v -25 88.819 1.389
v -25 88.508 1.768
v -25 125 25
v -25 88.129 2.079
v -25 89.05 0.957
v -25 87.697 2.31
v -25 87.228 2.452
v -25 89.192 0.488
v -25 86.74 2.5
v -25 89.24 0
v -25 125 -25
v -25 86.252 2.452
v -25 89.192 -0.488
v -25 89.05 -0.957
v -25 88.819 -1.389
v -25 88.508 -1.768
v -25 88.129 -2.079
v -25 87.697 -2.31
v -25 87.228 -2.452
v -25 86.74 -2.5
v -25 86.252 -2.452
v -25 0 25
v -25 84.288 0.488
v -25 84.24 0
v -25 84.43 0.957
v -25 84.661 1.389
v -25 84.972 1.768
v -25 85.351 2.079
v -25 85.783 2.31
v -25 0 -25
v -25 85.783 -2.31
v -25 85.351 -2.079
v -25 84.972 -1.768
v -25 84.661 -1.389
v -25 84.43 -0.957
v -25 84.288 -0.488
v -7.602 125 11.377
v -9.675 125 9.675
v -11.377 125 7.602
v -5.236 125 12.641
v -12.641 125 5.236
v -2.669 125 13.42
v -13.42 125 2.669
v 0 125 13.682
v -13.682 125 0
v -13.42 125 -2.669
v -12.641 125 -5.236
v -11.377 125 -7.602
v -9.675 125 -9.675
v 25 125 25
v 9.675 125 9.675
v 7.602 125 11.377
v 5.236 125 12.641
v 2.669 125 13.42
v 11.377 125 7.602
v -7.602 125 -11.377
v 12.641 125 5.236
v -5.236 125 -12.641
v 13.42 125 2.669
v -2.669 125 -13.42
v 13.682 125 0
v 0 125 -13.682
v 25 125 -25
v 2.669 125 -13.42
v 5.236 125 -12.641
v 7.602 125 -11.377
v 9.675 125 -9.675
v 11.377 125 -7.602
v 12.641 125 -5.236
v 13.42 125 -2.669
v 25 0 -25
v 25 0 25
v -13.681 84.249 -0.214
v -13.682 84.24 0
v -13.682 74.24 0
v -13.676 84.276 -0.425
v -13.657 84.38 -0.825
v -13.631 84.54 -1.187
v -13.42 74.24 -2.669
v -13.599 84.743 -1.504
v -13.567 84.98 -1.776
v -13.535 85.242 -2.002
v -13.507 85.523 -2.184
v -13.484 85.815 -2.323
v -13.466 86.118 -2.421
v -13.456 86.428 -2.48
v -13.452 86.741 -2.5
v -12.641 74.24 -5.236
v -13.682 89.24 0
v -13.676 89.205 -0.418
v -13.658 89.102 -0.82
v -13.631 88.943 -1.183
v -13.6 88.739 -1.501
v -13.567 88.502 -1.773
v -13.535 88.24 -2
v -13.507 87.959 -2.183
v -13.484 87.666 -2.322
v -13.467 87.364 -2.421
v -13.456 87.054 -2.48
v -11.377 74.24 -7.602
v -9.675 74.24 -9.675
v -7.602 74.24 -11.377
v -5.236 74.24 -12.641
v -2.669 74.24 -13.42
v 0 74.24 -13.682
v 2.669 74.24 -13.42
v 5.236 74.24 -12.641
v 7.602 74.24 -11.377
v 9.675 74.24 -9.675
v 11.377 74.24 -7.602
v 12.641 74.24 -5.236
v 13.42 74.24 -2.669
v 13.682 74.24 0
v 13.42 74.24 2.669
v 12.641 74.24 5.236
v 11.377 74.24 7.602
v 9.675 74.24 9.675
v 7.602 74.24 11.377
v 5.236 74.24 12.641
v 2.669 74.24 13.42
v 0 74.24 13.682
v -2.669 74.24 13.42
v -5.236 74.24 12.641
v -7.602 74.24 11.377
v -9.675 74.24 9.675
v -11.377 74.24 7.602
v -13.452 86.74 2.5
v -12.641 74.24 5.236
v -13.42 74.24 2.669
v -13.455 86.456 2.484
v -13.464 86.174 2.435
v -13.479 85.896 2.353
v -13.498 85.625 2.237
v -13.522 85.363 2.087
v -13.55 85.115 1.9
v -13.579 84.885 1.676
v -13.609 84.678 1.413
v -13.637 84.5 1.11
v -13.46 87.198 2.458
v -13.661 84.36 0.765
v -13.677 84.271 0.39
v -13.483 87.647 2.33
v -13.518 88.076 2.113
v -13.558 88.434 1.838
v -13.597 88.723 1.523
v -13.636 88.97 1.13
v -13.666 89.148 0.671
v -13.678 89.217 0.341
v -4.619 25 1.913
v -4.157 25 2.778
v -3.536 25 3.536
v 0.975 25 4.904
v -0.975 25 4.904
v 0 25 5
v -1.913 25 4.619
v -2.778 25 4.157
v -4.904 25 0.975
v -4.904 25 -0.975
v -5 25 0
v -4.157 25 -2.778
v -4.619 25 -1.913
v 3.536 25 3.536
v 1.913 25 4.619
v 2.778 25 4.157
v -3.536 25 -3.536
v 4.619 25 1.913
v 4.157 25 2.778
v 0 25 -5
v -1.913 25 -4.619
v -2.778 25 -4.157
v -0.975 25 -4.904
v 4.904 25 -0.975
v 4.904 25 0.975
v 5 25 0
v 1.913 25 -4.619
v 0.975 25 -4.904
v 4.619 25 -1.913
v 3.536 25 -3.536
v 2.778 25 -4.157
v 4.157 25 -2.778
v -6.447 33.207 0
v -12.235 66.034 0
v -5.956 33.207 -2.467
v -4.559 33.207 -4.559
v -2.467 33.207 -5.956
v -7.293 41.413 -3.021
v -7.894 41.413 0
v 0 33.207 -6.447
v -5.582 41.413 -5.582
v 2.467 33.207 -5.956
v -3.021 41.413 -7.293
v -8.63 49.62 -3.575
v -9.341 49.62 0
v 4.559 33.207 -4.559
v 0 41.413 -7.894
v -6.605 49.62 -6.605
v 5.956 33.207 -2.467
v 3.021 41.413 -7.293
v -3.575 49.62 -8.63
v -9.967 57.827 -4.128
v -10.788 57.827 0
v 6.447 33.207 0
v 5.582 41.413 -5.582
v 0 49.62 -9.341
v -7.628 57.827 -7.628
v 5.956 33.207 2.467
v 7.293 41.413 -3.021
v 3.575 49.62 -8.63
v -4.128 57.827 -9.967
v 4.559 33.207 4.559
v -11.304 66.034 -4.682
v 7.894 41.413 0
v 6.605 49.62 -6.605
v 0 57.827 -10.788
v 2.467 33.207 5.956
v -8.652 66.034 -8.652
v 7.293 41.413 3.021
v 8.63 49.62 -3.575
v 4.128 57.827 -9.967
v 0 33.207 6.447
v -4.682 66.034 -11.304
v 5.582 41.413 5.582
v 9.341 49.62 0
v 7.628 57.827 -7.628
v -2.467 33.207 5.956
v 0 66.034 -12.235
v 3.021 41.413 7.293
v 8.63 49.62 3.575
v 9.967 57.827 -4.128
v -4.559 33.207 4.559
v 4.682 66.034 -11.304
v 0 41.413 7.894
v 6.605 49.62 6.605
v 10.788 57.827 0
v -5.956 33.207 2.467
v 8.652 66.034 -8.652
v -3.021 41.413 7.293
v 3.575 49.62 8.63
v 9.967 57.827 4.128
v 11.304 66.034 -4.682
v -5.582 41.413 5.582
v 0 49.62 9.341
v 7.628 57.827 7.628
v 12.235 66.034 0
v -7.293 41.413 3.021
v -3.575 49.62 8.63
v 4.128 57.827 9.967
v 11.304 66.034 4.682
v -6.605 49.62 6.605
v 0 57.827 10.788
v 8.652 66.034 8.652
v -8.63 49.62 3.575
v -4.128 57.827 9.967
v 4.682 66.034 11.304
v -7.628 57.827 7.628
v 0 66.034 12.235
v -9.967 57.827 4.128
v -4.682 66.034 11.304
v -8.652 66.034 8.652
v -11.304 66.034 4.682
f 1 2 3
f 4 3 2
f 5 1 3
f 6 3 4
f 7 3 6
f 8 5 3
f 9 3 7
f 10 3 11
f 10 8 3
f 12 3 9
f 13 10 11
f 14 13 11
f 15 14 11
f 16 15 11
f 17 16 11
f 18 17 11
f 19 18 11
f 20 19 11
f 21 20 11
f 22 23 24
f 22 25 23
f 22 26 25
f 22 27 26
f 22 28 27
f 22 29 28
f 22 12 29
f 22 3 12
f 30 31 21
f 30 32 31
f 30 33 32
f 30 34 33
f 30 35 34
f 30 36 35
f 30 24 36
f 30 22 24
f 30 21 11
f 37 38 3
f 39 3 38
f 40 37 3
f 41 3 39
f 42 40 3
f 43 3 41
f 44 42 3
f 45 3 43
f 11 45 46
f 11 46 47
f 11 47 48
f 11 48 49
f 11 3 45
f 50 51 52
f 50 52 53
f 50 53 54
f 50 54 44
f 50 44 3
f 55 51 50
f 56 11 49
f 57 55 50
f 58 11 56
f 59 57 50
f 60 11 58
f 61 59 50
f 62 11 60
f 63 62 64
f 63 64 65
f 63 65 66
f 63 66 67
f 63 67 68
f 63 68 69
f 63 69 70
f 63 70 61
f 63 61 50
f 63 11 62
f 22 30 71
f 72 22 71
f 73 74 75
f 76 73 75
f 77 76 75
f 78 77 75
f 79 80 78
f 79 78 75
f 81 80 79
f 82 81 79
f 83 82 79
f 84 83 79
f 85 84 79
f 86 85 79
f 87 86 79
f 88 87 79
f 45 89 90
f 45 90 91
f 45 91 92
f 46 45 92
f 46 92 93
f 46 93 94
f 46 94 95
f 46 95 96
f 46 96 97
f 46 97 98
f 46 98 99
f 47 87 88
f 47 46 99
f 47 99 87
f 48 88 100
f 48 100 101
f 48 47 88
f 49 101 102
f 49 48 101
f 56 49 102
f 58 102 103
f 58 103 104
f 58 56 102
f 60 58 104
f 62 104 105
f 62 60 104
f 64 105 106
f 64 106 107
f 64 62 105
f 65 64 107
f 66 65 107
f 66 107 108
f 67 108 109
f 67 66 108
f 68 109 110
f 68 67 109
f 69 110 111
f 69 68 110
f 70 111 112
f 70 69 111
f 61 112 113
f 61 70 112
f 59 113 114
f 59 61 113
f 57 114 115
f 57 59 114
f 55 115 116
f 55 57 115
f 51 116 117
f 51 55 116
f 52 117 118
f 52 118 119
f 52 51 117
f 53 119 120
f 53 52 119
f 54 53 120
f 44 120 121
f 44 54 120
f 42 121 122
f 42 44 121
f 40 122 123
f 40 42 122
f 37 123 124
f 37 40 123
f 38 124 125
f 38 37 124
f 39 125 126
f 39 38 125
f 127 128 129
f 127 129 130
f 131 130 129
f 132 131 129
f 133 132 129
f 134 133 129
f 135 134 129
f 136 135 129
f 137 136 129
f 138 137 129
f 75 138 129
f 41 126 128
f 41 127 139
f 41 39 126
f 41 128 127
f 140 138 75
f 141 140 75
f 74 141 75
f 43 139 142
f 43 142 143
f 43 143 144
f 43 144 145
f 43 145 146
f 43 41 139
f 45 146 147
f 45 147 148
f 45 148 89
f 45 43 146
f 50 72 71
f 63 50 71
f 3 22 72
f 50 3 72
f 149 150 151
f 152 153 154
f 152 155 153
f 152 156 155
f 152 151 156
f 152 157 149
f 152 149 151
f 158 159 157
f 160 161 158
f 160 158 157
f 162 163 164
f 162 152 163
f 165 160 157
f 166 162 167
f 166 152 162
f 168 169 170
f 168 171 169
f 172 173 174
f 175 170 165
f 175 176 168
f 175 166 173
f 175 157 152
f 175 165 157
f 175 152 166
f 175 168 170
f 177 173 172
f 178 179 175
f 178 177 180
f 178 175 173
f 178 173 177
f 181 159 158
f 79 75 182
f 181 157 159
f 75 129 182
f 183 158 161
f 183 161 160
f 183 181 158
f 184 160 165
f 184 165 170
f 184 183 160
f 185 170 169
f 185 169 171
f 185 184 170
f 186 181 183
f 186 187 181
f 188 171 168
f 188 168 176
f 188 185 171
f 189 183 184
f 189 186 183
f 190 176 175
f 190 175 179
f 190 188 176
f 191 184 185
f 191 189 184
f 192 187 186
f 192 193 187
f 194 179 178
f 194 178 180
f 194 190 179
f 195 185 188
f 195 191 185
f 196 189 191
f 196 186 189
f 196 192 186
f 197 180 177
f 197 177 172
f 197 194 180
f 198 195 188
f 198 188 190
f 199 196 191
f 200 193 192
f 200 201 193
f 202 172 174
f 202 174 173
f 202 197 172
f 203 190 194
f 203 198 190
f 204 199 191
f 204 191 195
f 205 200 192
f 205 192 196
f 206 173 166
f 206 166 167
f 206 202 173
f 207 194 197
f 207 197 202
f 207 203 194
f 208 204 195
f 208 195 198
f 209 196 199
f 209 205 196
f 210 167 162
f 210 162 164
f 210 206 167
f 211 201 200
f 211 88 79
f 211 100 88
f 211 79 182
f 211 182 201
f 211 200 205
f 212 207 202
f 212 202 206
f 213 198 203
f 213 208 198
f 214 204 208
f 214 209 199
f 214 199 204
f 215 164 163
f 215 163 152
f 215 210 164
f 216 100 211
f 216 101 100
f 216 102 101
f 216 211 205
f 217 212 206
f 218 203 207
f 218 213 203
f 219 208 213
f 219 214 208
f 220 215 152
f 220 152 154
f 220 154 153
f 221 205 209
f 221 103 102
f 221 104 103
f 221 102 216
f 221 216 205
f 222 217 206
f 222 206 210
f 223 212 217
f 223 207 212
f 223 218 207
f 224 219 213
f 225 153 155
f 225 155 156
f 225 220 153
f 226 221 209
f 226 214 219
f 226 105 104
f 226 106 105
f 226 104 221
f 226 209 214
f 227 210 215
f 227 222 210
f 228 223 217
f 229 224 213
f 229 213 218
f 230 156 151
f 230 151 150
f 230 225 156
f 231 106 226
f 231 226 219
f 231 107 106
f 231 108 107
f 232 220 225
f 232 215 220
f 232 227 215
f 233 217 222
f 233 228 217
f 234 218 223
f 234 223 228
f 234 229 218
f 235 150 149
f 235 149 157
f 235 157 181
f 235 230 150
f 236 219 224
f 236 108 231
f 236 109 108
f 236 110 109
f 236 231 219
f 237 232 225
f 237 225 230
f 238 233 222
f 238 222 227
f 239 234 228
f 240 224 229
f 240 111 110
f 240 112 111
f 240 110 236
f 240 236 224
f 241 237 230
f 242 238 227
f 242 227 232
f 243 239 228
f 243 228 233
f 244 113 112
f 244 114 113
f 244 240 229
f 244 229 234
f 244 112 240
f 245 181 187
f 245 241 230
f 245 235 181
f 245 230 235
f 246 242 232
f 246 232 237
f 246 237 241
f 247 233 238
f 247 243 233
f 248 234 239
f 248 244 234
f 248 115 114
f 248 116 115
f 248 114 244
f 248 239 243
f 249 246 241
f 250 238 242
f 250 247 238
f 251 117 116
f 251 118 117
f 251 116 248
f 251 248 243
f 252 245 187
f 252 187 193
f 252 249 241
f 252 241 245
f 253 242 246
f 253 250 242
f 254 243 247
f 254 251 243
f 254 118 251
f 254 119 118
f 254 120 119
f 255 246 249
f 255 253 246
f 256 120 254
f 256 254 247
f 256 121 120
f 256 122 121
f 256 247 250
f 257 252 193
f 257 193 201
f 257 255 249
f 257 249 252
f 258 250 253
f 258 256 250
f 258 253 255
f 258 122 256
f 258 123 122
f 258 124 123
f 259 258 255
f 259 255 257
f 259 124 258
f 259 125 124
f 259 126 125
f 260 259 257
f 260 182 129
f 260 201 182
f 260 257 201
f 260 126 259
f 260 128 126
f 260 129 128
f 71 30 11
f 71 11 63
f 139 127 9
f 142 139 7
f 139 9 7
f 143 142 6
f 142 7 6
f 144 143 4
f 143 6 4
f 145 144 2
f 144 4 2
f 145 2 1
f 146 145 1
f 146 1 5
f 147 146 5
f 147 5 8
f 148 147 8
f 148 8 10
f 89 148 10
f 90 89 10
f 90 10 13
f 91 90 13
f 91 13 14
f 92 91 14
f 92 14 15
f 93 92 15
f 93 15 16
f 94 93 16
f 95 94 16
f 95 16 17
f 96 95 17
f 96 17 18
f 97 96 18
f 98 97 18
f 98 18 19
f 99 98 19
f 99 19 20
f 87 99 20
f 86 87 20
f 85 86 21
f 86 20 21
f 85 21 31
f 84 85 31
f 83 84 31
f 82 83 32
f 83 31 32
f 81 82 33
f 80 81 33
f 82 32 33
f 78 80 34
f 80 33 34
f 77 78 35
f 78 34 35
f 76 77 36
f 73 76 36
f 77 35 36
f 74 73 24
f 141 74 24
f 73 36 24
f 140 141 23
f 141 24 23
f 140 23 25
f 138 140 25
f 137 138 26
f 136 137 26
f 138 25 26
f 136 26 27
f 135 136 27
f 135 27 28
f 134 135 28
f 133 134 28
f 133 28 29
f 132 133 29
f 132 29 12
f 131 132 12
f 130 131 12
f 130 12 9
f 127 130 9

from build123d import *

# Parameters (mm, degrees)
SKETCH_1_W               = 50
SKETCH_1_H               = 50
EXTRUDE_1_DEPTH          = 125
CUT_EXTRUDE_1_REACH      = 138.931
CUT_EXTRUDE_1_END_RADIUS = 13.682408883
SKETCH_4_R               = 2.5


with BuildPart() as part:
    # 草图1 → 凸台-拉伸1 (new body)
    with BuildSketch(Plane(origin=(0, 0, 0), x_dir=(1, 0, 0), z_dir=(0, 1, 0))):
        Rectangle(SKETCH_1_W, SKETCH_1_H)
    extrude(amount=EXTRUDE_1_DEPTH)

    # 草图3 → 切除-旋转1 (revolve, cut)
    with BuildSketch(Plane.XY, mode=Mode.PRIVATE) as cut_revolve_1_sk:
        Polygon((0, 125), (0, 25), (5, 25), (13.682408883, 74.240387651), (13.682408883, 125), align=None)
    revolve(cut_revolve_1_sk.sketch.rotate(Axis((0, 125, 0), (0, -1, 0)), 180), axis=Axis((0, 125, 0), (0, -1, 0)), mode=Mode.SUBTRACT)

    # 切除-拉伸1: up to this cylinder (the profile starts outside it)
    cut_extrude_1_end = Plane(origin=(0, 86.74, 0), z_dir=(0, 1, 0)) * Cylinder(CUT_EXTRUDE_1_END_RADIUS, 306.226817767, mode=Mode.PRIVATE)
    # 草图4 → 切除-拉伸1 (cut, up to the surface)
    with BuildSketch(Plane.ZY.offset(25), mode=Mode.PRIVATE) as cut_extrude_1_sk1:
        with Locations((0, 86.74)):
            Circle(SKETCH_4_R)
    cut_extrude_1_tool1 = extrude(cut_extrude_1_sk1.sketch, amount=-CUT_EXTRUDE_1_REACH, mode=Mode.PRIVATE) - cut_extrude_1_end
    add(cut_extrude_1_tool1.solids().sort_by_distance((-25, 86.74, 0))[0], mode=Mode.SUBTRACT)


solid = part.part
